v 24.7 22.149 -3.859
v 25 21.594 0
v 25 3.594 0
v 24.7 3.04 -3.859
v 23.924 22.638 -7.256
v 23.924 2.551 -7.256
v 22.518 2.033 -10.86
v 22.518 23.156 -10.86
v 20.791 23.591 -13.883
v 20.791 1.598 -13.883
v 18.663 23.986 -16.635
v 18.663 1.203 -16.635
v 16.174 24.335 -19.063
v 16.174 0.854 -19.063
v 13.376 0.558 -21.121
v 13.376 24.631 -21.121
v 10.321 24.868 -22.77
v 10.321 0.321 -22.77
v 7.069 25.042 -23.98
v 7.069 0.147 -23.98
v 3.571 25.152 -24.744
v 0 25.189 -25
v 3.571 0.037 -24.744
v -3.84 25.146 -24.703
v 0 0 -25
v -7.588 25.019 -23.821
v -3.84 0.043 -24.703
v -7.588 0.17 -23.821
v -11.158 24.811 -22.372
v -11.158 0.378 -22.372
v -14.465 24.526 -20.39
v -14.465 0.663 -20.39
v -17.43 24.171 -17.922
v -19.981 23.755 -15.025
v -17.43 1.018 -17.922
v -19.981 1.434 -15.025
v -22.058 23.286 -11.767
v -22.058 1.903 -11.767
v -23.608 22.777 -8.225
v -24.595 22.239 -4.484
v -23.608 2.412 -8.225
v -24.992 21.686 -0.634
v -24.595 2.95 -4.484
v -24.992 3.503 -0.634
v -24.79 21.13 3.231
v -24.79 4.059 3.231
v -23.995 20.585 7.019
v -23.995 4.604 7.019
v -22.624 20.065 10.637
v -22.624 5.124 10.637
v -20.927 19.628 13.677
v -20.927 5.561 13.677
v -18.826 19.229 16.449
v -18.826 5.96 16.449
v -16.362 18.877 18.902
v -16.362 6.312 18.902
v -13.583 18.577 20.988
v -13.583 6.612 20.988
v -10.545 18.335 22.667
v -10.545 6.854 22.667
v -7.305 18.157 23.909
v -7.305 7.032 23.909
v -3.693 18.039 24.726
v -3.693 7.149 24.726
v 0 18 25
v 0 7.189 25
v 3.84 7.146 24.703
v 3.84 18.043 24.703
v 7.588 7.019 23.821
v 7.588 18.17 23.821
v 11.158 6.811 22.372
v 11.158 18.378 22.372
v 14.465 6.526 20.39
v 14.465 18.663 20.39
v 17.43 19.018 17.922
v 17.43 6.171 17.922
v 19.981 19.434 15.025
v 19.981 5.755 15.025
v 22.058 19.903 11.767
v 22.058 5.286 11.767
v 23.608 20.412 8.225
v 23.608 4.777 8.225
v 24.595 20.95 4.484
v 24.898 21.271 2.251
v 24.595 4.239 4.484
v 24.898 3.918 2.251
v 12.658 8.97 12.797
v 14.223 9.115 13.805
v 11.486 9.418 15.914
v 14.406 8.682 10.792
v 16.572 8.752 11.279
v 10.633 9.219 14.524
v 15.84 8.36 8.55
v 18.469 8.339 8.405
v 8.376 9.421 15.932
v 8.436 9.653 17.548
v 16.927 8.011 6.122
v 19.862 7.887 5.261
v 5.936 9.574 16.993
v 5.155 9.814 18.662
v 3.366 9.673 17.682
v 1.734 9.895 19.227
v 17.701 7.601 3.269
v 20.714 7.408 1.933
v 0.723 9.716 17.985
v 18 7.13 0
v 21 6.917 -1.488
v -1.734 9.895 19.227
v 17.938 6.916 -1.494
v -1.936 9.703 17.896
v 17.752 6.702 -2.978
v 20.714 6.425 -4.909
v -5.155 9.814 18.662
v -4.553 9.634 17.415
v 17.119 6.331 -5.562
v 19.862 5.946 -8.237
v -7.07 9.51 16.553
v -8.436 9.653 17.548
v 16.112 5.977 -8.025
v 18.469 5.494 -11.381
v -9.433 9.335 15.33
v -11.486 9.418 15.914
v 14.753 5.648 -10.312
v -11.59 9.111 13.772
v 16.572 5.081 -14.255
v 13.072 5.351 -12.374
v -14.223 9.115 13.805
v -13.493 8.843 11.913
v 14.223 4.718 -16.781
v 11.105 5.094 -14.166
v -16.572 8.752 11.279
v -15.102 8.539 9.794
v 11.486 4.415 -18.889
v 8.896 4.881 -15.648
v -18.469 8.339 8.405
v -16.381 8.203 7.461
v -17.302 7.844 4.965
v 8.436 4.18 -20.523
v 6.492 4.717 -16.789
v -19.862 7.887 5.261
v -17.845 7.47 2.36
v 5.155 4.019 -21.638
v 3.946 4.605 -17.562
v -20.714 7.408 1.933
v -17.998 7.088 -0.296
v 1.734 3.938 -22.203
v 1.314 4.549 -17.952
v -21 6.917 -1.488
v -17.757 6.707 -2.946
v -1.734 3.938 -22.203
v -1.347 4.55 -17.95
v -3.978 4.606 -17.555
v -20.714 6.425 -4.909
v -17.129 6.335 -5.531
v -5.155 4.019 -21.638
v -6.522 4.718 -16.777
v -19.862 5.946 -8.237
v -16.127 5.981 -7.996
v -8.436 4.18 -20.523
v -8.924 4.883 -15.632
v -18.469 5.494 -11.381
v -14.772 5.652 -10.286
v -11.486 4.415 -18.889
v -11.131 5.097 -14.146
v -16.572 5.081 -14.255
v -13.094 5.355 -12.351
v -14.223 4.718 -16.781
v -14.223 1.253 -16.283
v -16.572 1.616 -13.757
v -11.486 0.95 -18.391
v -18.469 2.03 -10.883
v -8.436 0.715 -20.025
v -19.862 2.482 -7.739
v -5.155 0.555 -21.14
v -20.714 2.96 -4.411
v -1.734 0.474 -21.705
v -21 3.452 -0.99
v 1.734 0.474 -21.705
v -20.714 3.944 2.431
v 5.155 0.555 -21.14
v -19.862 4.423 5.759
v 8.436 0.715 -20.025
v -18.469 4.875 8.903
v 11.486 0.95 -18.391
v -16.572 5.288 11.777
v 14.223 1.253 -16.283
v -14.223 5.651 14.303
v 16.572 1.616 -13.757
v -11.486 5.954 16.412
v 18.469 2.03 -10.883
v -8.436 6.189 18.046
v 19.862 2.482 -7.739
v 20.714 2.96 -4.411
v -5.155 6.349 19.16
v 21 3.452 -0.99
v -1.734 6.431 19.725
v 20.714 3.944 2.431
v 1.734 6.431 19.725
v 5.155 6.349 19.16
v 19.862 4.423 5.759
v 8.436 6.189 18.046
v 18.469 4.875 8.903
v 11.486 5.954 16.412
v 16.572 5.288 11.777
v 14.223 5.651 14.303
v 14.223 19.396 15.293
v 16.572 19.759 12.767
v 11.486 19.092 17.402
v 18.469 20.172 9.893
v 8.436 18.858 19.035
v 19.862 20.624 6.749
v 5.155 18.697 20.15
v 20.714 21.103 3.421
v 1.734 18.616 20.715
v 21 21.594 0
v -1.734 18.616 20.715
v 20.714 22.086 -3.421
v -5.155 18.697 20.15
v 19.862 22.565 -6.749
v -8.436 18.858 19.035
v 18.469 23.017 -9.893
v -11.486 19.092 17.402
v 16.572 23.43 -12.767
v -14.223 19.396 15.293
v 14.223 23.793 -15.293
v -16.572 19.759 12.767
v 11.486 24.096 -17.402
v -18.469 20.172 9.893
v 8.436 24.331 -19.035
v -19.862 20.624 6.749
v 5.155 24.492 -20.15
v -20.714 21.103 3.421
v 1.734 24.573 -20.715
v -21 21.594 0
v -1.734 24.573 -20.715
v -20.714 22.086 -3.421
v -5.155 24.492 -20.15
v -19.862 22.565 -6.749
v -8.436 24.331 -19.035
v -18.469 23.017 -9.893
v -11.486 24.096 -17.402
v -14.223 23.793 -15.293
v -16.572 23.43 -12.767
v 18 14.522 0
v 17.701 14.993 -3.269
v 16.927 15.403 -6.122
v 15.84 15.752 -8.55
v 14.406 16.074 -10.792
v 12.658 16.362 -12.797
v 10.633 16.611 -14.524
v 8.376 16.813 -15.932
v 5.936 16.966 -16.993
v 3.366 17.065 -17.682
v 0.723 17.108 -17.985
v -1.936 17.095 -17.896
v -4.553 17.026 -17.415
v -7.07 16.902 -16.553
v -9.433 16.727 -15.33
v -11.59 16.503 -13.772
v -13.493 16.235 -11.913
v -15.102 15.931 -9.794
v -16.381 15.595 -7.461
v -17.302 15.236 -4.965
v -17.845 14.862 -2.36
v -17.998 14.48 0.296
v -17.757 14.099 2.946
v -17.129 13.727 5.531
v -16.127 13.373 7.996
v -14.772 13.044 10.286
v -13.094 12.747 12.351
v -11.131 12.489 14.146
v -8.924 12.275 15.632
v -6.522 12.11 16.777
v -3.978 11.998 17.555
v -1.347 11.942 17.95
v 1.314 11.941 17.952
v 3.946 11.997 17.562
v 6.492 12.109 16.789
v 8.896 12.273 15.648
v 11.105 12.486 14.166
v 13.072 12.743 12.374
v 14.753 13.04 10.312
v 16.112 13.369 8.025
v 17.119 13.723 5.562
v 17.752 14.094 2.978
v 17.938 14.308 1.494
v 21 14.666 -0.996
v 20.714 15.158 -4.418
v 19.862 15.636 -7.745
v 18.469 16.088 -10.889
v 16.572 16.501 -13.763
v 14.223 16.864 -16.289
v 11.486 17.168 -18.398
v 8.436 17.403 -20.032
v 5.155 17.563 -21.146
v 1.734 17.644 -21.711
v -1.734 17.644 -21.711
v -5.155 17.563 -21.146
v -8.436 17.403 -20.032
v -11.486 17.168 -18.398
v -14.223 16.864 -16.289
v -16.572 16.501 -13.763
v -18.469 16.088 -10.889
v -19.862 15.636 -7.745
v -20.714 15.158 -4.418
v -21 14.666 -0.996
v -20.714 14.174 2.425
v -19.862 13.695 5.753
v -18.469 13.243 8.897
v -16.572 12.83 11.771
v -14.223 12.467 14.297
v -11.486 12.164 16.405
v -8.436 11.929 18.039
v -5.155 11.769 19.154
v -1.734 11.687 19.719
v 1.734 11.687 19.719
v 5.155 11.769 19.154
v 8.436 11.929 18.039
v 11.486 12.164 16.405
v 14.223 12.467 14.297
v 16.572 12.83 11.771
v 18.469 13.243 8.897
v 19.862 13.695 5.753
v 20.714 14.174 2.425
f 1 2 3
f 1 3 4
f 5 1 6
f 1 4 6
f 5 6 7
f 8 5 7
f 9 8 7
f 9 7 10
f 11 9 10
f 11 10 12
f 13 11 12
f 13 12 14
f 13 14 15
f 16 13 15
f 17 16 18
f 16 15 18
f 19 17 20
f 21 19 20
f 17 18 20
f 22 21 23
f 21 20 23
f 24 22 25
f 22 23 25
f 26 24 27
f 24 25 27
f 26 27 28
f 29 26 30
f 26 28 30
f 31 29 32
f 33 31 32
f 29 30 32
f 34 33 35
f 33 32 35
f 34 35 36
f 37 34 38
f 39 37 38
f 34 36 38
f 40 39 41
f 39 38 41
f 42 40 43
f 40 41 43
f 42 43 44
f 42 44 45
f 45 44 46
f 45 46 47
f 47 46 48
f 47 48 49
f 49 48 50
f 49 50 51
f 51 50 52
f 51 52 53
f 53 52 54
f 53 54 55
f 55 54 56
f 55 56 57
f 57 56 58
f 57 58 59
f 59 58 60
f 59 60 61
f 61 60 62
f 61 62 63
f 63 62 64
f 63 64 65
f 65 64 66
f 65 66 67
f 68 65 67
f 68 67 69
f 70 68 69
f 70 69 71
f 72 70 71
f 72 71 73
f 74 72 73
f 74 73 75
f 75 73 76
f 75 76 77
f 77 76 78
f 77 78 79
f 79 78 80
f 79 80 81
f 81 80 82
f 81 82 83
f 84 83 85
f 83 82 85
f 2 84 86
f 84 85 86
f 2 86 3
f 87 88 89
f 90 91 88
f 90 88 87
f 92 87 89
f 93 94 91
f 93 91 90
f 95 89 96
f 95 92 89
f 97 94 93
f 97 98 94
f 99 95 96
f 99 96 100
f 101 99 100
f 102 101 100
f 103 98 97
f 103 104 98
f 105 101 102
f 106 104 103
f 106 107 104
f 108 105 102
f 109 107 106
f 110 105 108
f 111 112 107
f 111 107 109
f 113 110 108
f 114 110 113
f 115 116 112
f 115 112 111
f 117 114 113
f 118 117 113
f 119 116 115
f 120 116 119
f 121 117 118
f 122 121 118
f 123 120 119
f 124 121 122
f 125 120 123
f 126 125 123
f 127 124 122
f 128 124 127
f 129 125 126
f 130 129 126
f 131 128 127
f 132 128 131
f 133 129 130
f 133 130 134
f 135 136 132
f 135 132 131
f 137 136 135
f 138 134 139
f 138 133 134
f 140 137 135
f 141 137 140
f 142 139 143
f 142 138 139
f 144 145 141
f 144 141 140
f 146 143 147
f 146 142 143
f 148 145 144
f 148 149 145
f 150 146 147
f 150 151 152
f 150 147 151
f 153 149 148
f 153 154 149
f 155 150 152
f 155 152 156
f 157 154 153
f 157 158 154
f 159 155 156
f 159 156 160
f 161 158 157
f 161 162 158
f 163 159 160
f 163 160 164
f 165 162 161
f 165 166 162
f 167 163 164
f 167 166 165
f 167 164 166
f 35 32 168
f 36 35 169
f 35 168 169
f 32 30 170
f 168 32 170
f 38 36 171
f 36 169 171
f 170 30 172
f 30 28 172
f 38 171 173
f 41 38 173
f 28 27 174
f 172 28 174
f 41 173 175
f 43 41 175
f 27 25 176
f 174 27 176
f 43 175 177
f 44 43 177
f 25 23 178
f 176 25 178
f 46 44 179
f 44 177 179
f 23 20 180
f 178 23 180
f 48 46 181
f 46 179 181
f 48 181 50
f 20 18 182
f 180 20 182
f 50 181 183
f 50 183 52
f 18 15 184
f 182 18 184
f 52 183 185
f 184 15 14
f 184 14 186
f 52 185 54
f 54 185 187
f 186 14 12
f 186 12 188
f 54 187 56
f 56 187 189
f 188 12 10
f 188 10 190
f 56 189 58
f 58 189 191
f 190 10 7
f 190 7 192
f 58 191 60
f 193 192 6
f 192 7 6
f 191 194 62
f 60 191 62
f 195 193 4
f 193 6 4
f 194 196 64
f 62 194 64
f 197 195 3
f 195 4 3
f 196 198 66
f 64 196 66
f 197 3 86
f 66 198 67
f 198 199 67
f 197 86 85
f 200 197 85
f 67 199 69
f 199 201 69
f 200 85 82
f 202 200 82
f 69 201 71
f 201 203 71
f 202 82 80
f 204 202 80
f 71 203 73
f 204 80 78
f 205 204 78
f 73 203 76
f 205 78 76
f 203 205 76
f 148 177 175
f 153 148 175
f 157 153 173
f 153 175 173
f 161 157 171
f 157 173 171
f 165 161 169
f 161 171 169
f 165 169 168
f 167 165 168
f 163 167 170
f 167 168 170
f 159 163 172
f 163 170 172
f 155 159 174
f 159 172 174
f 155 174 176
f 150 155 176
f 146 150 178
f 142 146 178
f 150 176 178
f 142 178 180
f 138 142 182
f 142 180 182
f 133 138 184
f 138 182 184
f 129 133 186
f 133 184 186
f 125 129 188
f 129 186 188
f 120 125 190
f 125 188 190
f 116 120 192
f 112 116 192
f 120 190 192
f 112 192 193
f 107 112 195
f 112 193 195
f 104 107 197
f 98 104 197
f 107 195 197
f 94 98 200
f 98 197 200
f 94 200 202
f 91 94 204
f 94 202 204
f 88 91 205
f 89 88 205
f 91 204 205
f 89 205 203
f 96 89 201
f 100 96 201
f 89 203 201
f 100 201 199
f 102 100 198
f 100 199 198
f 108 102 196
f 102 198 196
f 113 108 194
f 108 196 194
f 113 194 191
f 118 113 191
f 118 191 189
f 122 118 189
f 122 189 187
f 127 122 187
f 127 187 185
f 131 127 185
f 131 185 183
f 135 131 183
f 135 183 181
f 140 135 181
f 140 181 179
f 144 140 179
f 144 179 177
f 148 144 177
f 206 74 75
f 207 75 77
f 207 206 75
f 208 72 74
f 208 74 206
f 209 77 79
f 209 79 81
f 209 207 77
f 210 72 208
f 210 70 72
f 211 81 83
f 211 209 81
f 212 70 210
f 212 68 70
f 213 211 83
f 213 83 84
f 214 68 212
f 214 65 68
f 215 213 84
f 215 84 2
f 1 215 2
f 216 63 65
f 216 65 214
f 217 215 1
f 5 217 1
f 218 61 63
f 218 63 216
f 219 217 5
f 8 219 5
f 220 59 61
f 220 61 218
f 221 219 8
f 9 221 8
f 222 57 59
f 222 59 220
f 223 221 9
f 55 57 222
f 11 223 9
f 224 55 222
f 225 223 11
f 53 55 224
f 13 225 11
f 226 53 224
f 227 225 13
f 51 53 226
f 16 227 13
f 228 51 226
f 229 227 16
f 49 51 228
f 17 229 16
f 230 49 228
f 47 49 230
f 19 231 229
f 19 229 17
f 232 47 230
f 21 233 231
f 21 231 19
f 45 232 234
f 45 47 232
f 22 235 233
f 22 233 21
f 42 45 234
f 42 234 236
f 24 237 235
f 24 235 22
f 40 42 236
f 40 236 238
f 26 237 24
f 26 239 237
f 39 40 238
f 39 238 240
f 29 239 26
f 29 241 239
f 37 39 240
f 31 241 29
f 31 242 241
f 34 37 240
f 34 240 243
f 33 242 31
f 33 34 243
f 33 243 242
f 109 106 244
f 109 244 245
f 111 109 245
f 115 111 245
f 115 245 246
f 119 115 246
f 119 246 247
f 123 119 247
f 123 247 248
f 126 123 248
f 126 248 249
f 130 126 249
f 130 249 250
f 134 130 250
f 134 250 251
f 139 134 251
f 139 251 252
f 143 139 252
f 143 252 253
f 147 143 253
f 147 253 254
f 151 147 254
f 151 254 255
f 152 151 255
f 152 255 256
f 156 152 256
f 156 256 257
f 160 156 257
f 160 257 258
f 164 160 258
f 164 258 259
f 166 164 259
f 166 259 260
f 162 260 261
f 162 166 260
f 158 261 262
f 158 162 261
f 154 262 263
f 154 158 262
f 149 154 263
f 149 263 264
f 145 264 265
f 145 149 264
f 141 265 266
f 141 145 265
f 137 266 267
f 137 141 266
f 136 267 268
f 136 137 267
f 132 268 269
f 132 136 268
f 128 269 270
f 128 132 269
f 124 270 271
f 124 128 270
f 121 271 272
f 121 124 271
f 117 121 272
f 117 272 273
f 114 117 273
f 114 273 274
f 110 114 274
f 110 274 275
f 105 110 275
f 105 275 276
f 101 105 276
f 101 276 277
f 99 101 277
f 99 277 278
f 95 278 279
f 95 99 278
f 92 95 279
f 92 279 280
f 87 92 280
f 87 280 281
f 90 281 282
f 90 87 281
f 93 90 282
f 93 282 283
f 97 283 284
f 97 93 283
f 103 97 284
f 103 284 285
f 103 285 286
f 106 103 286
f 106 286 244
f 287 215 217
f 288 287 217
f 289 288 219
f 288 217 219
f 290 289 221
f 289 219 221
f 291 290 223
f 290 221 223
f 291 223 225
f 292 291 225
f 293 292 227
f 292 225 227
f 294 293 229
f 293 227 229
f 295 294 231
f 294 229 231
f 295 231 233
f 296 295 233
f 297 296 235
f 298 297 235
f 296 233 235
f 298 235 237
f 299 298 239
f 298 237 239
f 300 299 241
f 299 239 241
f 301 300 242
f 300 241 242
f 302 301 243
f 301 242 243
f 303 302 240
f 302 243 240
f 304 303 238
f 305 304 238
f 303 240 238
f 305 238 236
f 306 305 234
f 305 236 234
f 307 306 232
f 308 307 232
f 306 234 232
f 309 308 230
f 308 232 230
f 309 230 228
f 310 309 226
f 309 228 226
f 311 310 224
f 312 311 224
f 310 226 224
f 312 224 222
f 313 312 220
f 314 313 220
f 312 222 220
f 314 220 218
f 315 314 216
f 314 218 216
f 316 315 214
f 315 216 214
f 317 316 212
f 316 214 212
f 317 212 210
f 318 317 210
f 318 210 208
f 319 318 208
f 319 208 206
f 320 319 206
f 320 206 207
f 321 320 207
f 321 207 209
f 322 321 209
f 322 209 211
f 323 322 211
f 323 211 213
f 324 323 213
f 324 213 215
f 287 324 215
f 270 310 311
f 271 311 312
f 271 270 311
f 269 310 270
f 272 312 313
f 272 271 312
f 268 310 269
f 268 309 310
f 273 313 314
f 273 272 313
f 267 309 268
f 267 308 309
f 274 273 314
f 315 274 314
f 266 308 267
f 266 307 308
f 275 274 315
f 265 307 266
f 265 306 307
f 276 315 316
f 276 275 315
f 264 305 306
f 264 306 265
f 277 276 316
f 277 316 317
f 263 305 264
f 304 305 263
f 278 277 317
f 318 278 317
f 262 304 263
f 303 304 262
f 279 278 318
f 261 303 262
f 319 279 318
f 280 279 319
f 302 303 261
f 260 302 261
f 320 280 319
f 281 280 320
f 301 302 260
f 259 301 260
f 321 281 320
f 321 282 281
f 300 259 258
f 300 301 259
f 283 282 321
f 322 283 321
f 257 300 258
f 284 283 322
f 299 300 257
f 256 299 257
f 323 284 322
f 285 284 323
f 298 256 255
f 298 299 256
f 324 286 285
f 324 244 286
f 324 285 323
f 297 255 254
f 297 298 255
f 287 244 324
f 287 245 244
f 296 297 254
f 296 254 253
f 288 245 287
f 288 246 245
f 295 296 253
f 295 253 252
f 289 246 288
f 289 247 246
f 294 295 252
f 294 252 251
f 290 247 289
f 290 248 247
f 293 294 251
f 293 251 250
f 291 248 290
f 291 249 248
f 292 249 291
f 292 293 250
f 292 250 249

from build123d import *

# Parameters (mm, degrees)
SKETCH_1_R          = 25
EXTRUDE_1_DEPTH     = 30
CUT_EXTRUDE_1_DEPTH = 31.5
SKETCH_7_R          = 21
CUT_EXTRUDE_2_DEPTH = 7
SKETCH_8_R          = 21
CUT_EXTRUDE_3_DEPTH = 3.5
SKETCH_9_R          = 18
CUT_EXTRUDE_4_DEPTH = 107.5


with BuildPart() as part:
    # 草图1 → 凸台-拉伸1 (new body)
    with BuildSketch(Plane(origin=(0, 0, 0), x_dir=(1, 0, 0), z_dir=(0, 1, 0))):
        Circle(SKETCH_1_R)
    extrude(amount=EXTRUDE_1_DEPTH)

    # 草图3 → 切除-拉伸1 (cut, symmetric)
    with BuildSketch(Plane(origin=(0, 0, 0), x_dir=(0, 0, -1), z_dir=(1, 0, 0))):
        Polygon((-25, 18), (25, 25.188898505), (25, 39.510034579), (-25, 39.510034579), align=None)
        Polygon((25, 0), (-25, 7.188898505), (-25, -17.358468242), (25, -17.358468242), align=None)
    extrude(amount=CUT_EXTRUDE_1_DEPTH, both=True, mode=Mode.SUBTRACT)

    # 草图7 → 切除-拉伸2 (cut)
    with BuildSketch(Plane(origin=(0, 21.15708772, 3.041923126), x_dir=(1, 0, 0), z_dir=(0, 0.989821487, 0.142314524))):
        with Locations((0, 3.07320377)):
            Circle(SKETCH_7_R)
    extrude(amount=-CUT_EXTRUDE_2_DEPTH, mode=Mode.SUBTRACT)

    # 草图8 → 切除-拉伸3 (cut)
    with BuildSketch(Plane(origin=(0, 3.521649349, -0.506335595), x_dir=(-1, 0, 0), z_dir=(0, -0.989821487, 0.142314524))):
        with Locations((0, 0.488457665)):
            Circle(SKETCH_8_R)
    extrude(amount=-CUT_EXTRUDE_3_DEPTH, mode=Mode.SUBTRACT)

    # 草图9 → 切除-拉伸4 (cut)
    with BuildSketch(Plane(origin=(0, 0, 0), x_dir=(1, 0, 0), z_dir=(0, 1, 0))):
        Circle(SKETCH_9_R)
    extrude(amount=CUT_EXTRUDE_4_DEPTH, mode=Mode.SUBTRACT)


solid = part.part
